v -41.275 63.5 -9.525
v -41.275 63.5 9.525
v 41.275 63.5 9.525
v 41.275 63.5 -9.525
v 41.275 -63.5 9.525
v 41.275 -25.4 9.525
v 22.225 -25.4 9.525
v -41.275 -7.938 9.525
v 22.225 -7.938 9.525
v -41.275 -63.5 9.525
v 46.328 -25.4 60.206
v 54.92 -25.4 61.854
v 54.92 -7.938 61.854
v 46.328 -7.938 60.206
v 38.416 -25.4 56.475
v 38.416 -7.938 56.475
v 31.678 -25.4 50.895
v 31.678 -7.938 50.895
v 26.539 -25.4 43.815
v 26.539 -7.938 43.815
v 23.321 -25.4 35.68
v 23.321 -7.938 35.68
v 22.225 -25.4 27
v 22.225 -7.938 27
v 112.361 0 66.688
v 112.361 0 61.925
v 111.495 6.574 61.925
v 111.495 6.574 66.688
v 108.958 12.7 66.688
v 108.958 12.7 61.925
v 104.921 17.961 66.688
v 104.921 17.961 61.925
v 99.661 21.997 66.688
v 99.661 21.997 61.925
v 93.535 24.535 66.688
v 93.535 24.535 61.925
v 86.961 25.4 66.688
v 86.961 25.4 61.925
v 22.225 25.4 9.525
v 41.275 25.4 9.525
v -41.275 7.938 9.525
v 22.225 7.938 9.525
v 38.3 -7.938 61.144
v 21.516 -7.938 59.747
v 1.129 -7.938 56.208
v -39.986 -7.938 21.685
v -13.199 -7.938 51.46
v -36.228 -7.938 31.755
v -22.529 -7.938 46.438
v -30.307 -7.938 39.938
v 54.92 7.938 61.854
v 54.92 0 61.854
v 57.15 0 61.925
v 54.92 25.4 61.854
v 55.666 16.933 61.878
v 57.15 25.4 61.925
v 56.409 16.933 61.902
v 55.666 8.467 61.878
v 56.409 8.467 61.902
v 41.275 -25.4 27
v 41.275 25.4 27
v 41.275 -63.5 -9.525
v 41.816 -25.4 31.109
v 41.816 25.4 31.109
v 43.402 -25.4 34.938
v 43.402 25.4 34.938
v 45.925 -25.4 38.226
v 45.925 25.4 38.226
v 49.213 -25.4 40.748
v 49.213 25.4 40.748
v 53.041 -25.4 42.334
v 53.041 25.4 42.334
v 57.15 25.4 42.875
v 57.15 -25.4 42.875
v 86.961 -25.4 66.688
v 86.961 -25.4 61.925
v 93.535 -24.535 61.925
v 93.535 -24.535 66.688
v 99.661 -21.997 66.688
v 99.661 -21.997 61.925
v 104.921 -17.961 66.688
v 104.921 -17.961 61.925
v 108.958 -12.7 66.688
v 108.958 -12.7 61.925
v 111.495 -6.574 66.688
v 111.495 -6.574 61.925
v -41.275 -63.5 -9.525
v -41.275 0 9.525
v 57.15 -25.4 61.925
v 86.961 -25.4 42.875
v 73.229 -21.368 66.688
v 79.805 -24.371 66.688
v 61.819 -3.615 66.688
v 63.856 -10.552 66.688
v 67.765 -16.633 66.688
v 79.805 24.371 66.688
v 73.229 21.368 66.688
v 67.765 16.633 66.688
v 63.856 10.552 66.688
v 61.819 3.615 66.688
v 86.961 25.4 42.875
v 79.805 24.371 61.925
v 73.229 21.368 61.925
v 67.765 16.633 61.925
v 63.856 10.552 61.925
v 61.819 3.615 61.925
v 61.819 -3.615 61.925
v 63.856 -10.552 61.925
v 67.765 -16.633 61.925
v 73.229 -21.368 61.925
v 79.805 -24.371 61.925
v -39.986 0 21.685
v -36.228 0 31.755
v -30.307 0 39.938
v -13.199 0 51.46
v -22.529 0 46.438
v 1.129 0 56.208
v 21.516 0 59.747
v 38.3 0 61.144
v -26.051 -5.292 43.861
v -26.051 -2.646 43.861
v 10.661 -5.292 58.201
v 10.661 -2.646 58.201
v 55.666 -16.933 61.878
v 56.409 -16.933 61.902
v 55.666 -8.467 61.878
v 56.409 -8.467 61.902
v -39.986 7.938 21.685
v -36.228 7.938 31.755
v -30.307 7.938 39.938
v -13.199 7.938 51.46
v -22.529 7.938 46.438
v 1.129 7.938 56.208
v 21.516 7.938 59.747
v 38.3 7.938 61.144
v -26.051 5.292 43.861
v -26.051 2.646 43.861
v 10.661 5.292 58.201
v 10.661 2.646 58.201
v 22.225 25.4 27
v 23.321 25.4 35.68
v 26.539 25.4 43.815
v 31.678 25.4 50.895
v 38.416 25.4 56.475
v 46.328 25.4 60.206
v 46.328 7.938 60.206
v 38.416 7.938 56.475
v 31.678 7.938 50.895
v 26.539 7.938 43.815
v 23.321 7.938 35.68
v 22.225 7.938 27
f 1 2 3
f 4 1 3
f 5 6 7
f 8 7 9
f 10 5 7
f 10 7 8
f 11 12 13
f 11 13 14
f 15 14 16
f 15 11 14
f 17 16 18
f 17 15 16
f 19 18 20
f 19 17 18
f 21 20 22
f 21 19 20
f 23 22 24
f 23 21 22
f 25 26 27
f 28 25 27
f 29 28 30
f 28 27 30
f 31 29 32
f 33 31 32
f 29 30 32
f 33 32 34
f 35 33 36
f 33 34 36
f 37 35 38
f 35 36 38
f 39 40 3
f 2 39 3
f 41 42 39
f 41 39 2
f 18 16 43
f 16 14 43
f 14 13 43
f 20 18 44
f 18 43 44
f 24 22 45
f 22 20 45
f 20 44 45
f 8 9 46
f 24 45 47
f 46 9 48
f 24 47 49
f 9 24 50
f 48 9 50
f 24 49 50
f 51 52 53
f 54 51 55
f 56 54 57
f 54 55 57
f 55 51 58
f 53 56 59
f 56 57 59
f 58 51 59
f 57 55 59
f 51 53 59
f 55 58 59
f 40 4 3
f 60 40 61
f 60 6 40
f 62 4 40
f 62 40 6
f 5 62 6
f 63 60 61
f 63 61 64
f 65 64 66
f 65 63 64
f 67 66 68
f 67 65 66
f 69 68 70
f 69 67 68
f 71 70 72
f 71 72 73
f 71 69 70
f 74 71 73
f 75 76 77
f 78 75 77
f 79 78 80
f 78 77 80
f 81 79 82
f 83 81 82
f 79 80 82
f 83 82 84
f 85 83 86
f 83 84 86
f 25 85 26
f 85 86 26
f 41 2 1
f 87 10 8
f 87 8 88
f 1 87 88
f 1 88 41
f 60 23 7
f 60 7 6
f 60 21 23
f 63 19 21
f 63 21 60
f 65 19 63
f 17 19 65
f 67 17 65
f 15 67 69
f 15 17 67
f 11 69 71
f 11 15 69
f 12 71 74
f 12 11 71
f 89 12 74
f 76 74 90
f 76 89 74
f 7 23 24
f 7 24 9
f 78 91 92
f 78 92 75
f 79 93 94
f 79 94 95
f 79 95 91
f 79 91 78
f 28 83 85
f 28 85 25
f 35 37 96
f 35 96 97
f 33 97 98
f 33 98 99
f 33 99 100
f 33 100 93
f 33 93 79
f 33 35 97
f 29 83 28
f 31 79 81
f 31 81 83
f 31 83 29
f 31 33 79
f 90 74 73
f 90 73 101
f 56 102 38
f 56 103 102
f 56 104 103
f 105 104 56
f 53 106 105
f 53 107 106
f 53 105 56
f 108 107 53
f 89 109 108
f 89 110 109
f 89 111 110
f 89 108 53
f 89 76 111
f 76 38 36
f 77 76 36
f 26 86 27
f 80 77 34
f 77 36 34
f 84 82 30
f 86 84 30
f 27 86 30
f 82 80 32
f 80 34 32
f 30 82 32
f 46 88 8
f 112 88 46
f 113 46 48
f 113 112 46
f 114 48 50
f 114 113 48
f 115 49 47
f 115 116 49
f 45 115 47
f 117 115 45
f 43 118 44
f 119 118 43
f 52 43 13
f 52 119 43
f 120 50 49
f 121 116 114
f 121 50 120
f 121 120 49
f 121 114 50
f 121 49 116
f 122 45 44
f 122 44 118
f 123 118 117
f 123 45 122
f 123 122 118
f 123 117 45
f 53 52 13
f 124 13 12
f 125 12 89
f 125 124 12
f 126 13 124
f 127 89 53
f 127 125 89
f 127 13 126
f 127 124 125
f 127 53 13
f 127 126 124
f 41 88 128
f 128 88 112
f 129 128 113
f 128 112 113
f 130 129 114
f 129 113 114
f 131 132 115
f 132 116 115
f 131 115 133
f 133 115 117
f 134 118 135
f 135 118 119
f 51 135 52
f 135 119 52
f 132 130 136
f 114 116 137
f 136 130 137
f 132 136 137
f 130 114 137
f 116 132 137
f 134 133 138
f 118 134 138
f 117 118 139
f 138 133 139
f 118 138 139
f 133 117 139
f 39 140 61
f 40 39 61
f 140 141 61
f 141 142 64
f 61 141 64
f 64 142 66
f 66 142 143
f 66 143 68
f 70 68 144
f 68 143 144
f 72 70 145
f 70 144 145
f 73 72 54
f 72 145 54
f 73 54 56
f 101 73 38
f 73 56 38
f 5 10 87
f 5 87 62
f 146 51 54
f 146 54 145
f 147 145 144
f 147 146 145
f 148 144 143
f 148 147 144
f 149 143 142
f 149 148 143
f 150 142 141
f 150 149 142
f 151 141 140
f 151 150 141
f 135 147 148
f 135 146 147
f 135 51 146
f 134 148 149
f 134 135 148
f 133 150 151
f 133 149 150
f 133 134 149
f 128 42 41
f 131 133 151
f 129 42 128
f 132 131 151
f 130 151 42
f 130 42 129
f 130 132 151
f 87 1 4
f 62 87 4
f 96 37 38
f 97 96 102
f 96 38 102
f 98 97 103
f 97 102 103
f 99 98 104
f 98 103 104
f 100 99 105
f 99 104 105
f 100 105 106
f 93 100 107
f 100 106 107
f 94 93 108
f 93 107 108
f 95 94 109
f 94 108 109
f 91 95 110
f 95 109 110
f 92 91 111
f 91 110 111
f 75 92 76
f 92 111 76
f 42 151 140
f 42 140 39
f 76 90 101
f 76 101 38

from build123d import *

# Parameters (mm, degrees)
F1_DEPTH = 63.5
F0_W     = 26.635827
F0_H     = 19.05
F2_DEPTH = 25.4
F3_DEPTH = 7.9375
F5_DEPTH = 4.7625


with BuildPart() as f1:
    # F0 (on Front) → F1 (new body, symmetric)
    with BuildSketch(Plane.XZ):
        Polygon((-41.275, 9.525), (-41.275, -9.525), (41.275, -9.525), (41.275, 9.525), (22.225, 9.525), align=None)
    extrude(amount=F1_DEPTH, both=True)

    # F0 (on Front) → F2 (join, symmetric)
    with BuildSketch(Plane.XZ):
        with BuildLine():
            Line((22.225, 9.525), (41.275, 9.525))
            Line((41.275, 9.525), (41.275, 27.0002))
            ThreePointArc((41.275, 27.0002), (45.92468, 38.22552), (57.15, 42.8752))
            Line((57.15, 42.8752), (60.325, 42.8752))
            Line((60.325, 42.8752), (60.325, 61.9252))
            Line((60.325, 61.9252), (57.15, 61.9252))
            add(Edge.make_bspline(
                [(54.920282, 61.853951), (55.666465, 61.878241), (56.409811, 61.90192), (57.15, 61.9252)],
                knots=[109.619199, 109.619199, 109.619199, 109.619199, 111.504536, 111.504536, 111.504536, 111.504536], degree=3))
            ThreePointArc((54.920282, 61.853951), (31.678167, 50.894579), (22.225, 27.0002))
            Line((22.225, 27.0002), (22.225, 9.525))
        make_face()
        with Locations((73.642913, 52.4002)):
            Rectangle(F0_W, F0_H)
    extrude(amount=F2_DEPTH, both=True)

    # F0 (on Front) → F3 (join, symmetric)
    with BuildSketch(Plane.XZ):
        with BuildLine():
            add(Edge.make_bspline(
                [(-41.275, 9.525), (-41.442102, 56.961897), (11.534948, 60.441653), (54.920282, 61.853951)],
                knots=[0, 0, 0, 0, 109.619199, 109.619199, 109.619199, 109.619199], degree=3))
            Line((-41.275, 9.525), (22.225, 9.525))
            Line((22.225, 9.525), (22.225, 27.0002))
            ThreePointArc((22.225, 27.0002), (31.678167, 50.894579), (54.920282, 61.853951))
        make_face()
    extrude(amount=F3_DEPTH, both=True)

    # F4 (on face) → F5 (join)
    with BuildSketch(Plane.XY.offset(61.9252)):
        with BuildLine():
            Line((86.960827, -25.4), (86.960827, 25.4))
            ThreePointArc((86.960827, 25.4), (61.560827, 0), (86.960827, -25.4))
        make_face()
        with BuildLine():
            ThreePointArc((86.960827, -25.4), (104.921339, -17.960512), (112.360827, 0))
            ThreePointArc((112.360827, 0), (104.921339, 17.960512), (86.960827, 25.4))
            Line((86.960827, 25.4), (86.960827, -25.4))
        make_face()
    extrude(amount=F5_DEPTH)


solid = f1.part
